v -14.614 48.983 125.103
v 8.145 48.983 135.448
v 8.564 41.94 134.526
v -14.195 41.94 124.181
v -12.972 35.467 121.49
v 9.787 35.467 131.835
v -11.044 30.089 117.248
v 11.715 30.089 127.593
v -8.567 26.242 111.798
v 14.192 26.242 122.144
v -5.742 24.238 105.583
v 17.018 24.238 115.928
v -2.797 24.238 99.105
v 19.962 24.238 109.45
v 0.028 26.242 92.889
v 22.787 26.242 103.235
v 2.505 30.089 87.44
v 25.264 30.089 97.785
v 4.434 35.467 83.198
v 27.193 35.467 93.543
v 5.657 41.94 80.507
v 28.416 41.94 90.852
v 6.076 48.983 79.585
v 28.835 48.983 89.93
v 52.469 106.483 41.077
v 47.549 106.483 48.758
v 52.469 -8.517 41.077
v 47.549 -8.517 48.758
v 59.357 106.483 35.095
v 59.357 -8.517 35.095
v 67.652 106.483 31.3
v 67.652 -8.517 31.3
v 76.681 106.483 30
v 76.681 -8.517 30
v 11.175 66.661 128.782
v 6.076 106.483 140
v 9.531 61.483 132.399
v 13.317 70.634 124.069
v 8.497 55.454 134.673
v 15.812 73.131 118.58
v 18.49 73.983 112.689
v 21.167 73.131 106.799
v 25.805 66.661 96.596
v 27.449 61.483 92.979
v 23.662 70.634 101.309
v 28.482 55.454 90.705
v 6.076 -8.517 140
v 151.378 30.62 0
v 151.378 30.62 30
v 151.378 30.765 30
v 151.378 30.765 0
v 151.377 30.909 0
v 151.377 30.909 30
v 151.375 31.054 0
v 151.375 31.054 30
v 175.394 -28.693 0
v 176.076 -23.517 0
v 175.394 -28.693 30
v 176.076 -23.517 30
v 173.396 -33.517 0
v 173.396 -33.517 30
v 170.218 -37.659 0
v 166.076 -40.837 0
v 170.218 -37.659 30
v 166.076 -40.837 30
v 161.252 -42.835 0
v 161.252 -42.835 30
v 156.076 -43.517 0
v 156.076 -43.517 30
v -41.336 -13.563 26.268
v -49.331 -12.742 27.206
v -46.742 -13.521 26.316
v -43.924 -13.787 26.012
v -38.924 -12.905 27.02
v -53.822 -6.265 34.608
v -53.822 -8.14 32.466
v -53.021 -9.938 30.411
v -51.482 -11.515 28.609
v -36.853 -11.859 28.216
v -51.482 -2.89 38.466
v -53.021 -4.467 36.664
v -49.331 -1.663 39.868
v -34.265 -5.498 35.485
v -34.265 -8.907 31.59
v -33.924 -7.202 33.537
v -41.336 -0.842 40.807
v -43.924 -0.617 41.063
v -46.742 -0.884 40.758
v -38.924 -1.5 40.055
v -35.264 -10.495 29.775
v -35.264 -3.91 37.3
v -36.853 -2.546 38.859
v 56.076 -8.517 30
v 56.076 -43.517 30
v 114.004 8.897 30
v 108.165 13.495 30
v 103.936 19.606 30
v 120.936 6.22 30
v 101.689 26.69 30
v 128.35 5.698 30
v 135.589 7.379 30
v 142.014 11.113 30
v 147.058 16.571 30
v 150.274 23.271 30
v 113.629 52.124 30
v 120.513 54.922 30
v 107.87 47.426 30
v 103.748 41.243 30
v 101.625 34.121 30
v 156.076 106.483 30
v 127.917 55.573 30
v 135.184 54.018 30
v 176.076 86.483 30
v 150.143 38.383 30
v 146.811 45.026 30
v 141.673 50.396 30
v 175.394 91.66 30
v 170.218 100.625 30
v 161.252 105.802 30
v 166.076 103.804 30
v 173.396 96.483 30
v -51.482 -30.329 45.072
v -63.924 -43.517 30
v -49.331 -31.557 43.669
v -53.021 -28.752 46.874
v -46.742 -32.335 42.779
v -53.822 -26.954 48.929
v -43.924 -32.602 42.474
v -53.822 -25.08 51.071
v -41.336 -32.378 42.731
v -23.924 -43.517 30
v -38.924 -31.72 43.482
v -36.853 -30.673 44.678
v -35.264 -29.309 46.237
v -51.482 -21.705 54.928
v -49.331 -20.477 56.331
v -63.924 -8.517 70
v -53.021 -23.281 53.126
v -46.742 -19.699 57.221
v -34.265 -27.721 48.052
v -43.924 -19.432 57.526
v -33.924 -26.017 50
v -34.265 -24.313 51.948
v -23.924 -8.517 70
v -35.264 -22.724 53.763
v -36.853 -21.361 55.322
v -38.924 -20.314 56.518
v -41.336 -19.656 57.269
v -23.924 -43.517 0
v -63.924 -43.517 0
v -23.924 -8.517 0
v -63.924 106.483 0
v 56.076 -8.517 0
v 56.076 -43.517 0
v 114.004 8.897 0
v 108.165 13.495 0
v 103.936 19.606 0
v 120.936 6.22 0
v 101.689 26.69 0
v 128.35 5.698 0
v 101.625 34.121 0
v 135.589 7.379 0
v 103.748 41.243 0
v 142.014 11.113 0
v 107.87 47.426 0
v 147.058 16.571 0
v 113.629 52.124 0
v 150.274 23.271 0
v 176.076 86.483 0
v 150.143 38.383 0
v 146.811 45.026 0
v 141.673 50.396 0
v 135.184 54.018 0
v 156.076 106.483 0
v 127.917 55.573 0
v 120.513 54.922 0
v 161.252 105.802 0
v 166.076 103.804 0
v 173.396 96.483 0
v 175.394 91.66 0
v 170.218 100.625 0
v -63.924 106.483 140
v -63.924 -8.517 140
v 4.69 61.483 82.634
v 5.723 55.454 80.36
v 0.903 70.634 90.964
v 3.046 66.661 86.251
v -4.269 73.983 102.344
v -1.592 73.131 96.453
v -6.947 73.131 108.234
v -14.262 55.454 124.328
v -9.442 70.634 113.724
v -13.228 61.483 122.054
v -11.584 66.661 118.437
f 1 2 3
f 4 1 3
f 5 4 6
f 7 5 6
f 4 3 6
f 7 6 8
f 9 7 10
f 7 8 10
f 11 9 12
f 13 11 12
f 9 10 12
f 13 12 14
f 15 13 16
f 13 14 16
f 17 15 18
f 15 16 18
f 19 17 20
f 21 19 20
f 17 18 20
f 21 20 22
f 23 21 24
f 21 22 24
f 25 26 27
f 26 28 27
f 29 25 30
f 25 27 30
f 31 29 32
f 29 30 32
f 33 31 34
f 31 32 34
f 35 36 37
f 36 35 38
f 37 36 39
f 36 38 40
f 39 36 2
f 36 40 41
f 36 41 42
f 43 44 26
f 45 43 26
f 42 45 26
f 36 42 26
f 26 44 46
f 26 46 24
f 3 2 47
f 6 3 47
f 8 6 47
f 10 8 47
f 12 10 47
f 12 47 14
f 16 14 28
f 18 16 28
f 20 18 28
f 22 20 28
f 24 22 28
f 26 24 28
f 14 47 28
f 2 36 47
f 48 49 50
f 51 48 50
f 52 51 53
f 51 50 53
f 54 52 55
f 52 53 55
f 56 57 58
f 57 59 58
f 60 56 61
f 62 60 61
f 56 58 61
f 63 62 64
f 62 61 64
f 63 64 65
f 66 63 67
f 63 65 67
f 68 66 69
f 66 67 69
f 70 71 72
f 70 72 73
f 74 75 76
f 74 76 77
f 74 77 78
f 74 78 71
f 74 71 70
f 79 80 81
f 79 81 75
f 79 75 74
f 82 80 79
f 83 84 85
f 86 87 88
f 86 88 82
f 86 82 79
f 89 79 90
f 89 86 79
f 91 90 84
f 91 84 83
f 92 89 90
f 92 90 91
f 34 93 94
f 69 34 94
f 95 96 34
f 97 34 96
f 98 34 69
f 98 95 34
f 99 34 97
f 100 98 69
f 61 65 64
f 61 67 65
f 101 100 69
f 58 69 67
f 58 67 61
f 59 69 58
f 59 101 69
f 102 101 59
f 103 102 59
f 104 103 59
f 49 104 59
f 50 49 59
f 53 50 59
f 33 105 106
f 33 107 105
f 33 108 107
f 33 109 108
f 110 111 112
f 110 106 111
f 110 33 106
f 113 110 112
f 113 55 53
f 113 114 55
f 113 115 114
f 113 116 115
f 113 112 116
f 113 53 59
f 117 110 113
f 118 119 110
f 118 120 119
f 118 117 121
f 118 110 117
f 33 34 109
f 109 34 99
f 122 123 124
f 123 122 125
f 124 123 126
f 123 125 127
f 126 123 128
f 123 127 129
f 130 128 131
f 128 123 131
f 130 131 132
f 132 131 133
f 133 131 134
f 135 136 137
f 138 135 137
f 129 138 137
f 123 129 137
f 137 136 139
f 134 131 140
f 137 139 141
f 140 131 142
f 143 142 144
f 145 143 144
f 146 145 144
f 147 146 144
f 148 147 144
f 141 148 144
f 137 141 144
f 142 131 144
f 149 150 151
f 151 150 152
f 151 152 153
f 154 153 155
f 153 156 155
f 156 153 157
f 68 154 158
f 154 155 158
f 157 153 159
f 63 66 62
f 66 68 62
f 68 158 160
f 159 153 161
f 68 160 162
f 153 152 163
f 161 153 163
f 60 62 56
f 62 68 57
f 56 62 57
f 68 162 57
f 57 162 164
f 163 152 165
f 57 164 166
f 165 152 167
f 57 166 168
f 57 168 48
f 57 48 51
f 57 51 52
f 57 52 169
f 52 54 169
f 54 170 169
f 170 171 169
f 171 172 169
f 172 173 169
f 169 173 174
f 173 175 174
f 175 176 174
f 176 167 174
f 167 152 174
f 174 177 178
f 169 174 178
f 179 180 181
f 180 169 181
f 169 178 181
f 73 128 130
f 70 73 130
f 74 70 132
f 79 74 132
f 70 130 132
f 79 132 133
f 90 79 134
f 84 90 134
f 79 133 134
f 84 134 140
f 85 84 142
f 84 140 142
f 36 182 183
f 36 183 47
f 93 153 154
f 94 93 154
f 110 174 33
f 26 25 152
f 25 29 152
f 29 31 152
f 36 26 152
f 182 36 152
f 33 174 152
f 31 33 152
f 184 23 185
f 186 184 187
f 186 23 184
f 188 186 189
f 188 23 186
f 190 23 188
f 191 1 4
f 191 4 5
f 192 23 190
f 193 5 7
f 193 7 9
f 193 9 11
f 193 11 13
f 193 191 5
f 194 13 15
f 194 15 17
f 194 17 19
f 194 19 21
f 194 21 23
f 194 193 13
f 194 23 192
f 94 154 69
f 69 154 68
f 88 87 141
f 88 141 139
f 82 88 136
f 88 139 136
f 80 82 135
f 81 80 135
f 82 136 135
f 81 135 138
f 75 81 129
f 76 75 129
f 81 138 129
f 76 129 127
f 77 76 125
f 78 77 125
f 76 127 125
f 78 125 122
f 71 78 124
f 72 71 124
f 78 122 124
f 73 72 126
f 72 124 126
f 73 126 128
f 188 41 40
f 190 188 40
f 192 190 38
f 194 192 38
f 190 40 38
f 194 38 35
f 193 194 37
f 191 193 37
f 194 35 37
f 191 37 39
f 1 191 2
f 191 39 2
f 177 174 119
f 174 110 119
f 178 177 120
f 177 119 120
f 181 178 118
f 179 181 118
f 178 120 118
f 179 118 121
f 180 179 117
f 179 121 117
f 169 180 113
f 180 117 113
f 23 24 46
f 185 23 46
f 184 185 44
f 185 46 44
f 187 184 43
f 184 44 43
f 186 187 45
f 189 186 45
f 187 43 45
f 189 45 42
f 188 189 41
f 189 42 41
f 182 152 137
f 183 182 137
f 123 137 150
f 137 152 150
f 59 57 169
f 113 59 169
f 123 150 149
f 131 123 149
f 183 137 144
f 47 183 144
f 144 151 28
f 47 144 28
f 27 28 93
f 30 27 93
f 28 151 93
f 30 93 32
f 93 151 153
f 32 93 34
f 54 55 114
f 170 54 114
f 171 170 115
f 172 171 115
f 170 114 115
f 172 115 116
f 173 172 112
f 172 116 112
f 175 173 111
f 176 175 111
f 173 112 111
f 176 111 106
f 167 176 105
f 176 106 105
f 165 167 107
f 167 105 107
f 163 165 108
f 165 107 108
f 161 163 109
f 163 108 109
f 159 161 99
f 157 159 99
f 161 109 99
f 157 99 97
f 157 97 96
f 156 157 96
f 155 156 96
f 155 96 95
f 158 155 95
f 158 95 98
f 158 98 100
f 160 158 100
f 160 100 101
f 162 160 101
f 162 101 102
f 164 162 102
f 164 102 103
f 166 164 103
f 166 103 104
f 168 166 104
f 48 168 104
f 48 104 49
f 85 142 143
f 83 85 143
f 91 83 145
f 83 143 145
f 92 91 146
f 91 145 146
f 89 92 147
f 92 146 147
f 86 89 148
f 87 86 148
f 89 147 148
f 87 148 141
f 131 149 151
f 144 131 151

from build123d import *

# Parameters (mm, degrees)
F0_W      = 40
F0_H      = 35
F1_DEPTH  = 30
F2_DEPTH  = 70
F4_DEPTH  = 96
F5_DEPTH  = 140
F8_DEPTH  = 248
F9_DEPTH  = 25
F10_R     = 32
F11_R     = 20
F13_DEPTH = 140
F15_DEPTH = 25


with BuildPart() as f1:
    # F0 (on Top) → F1 (new body)
    with BuildSketch(Plane.XY):
        Polygon((56.0757917166, 106.4831405878), (-63.9242082834, 106.4831405878), (-63.9242082834, -8.5168594122), (-23.9242082834, -8.5168594122), (56.0757917166, -8.5168594122), align=None)
        with Locations((-43.9242082834, -26.0168594122)):
            Rectangle(F0_W, F0_H)
        Polygon((176.0757917166, 106.4831405878), (56.0757917166, 106.4831405878), (56.0757917166, -8.5168594122), (56.0757917166, -43.5168594122), (176.0757917166, -43.5168594122), align=None)
    extrude(amount=F1_DEPTH)



with BuildPart() as f2:
    # F0 (on Top) → F2 (new body)
    with BuildSketch(Plane.XY):
        with Locations((-43.9242082834, -26.0168594122)):
            Rectangle(F0_W, F0_H)
    extrude(amount=F2_DEPTH)

    # F3 (on face) → F4 (cut)
    with BuildSketch(Plane.YZ.offset(-23.9242082834)):
        Polygon((-43.5168594122, 70), (-43.5168594122, 30), (-8.5168594122, 70), align=None)
    extrude(amount=-F4_DEPTH, mode=Mode.SUBTRACT)


with BuildPart() as f1_1:
    add(f1.part)

    add(f2.part)  # F5 merges F2
    # F0 (on Top) → F5 (join)
    with BuildSketch(Plane.XY):
        Polygon((56.0757917166, 106.4831405878), (-63.9242082834, 106.4831405878), (-63.9242082834, -8.5168594122), (-23.9242082834, -8.5168594122), (56.0757917166, -8.5168594122), align=None)
    extrude(amount=F5_DEPTH)

    # F7 (on face) → F8 (cut)
    with BuildSketch(Plane.XZ.offset(8.5168594122)):
        Polygon((6.0757917166, 140), (56.0757917166, 30), (56.0757917166, 140), align=None)
    extrude(amount=-F8_DEPTH, mode=Mode.SUBTRACT)

    # F6 (on face) → F9 (cut)
    with BuildSketch(Plane(origin=(0, -39.5139734724, 34.5747267883), x_dir=(1, 0, 0), z_dir=(0, -0.7525766947, 0.6585046079))):
        with BuildLine():
            ThreePointArc((-33.9242082834, 20.4966129301), (-36.8531404716, 27.567680742), (-43.9242082834, 30.4966129301))
            Line((-43.9242082834, 30.4966129301), (-43.9242082834, 10.4966129301))
            ThreePointArc((-43.9242082834, 10.4966129301), (-36.8531404716, 13.4255451183), (-33.9242082834, 20.4966129301))
        make_face()
        with BuildLine():
            Line((-43.9242082834, 10.4966129301), (-43.9242082834, 30.4966129301))
            ThreePointArc((-43.9242082834, 30.4966129301), (-53.9242082834, 20.4966129301), (-43.9242082834, 10.4966129301))
        make_face()
    extrude(amount=-F9_DEPTH, mode=Mode.SUBTRACT)

    # F10
    f10_edges = [f1_1.edges().sort_by_distance(p)[0] for p in [
        (56.075792, 48.983141, 30),
    ]]
    fillet(f10_edges, radius=F10_R)

    # F11
    f11_edges = [f1_1.edges().sort_by_distance(p)[0] for p in [
        (176.075792, 106.483141, 15),
        (176.075792, -43.516859, 15),
    ]]
    fillet(f11_edges, radius=F11_R)

    # F12 (on face) → F13 (cut)
    with BuildSketch(Plane.XY.offset(30)):
        with BuildLine():
            ThreePointArc((151.3784040418, 30.6200258434), (151.3774616534, 30.8370938767), (151.3746345593, 31.0541455451))
            Line((151.3746345593, 31.0541455451), (101.3821735243, 30.1859061416))
            ThreePointArc((101.3821735243, 30.1859061416), (126.5954720752, 5.6209682318), (151.3784040418, 30.6200258434))
        make_face()
        with BuildLine():
            Line((101.3821735243, 30.1859061416), (151.3746345593, 31.0541455451))
            ThreePointArc((151.3746345593, 31.0541455451), (125.9442843401, 55.6162563609), (101.3821735243, 30.1859061416))
        make_face()
    extrude(amount=-F13_DEPTH, mode=Mode.SUBTRACT)

    # F14 (on face) → F15 (cut)
    with BuildSketch(Plane(origin=(57.77514245, 0, 26.2614283864), x_dir=(0, 1, 0), z_dir=(0.9103664775, 0, 0.4138029443))):
        with BuildLine():
            Line((48.9831405878, 119.9371263435), (48.9831405878, 107.1728393435))
            Line((48.9831405878, 107.1728393435), (48.9831405878, 94.9371263435))
            Line((48.9831405878, 94.9371263435), (48.9831405878, 69.9371263435))
            ThreePointArc((48.9831405878, 69.9371263435), (66.6608101175, 77.2594568138), (73.9831405878, 94.9371263435))
            ThreePointArc((73.9831405878, 94.9371263435), (66.6608101175, 112.6147958731), (48.9831405878, 119.9371263435))
        make_face()
        with BuildLine():
            Line((48.9831405878, 94.9371263435), (48.9831405878, 107.1728393435))
            Line((48.9831405878, 107.1728393435), (48.9831405878, 119.9371263435))
            ThreePointArc((48.9831405878, 119.9371263435), (23.9831405878, 94.9371263435), (48.9831405878, 69.9371263435))
            Line((48.9831405878, 69.9371263435), (48.9831405878, 94.9371263435))
        make_face()
    extrude(amount=-F15_DEPTH, mode=Mode.SUBTRACT)


solid = f1_1.part
